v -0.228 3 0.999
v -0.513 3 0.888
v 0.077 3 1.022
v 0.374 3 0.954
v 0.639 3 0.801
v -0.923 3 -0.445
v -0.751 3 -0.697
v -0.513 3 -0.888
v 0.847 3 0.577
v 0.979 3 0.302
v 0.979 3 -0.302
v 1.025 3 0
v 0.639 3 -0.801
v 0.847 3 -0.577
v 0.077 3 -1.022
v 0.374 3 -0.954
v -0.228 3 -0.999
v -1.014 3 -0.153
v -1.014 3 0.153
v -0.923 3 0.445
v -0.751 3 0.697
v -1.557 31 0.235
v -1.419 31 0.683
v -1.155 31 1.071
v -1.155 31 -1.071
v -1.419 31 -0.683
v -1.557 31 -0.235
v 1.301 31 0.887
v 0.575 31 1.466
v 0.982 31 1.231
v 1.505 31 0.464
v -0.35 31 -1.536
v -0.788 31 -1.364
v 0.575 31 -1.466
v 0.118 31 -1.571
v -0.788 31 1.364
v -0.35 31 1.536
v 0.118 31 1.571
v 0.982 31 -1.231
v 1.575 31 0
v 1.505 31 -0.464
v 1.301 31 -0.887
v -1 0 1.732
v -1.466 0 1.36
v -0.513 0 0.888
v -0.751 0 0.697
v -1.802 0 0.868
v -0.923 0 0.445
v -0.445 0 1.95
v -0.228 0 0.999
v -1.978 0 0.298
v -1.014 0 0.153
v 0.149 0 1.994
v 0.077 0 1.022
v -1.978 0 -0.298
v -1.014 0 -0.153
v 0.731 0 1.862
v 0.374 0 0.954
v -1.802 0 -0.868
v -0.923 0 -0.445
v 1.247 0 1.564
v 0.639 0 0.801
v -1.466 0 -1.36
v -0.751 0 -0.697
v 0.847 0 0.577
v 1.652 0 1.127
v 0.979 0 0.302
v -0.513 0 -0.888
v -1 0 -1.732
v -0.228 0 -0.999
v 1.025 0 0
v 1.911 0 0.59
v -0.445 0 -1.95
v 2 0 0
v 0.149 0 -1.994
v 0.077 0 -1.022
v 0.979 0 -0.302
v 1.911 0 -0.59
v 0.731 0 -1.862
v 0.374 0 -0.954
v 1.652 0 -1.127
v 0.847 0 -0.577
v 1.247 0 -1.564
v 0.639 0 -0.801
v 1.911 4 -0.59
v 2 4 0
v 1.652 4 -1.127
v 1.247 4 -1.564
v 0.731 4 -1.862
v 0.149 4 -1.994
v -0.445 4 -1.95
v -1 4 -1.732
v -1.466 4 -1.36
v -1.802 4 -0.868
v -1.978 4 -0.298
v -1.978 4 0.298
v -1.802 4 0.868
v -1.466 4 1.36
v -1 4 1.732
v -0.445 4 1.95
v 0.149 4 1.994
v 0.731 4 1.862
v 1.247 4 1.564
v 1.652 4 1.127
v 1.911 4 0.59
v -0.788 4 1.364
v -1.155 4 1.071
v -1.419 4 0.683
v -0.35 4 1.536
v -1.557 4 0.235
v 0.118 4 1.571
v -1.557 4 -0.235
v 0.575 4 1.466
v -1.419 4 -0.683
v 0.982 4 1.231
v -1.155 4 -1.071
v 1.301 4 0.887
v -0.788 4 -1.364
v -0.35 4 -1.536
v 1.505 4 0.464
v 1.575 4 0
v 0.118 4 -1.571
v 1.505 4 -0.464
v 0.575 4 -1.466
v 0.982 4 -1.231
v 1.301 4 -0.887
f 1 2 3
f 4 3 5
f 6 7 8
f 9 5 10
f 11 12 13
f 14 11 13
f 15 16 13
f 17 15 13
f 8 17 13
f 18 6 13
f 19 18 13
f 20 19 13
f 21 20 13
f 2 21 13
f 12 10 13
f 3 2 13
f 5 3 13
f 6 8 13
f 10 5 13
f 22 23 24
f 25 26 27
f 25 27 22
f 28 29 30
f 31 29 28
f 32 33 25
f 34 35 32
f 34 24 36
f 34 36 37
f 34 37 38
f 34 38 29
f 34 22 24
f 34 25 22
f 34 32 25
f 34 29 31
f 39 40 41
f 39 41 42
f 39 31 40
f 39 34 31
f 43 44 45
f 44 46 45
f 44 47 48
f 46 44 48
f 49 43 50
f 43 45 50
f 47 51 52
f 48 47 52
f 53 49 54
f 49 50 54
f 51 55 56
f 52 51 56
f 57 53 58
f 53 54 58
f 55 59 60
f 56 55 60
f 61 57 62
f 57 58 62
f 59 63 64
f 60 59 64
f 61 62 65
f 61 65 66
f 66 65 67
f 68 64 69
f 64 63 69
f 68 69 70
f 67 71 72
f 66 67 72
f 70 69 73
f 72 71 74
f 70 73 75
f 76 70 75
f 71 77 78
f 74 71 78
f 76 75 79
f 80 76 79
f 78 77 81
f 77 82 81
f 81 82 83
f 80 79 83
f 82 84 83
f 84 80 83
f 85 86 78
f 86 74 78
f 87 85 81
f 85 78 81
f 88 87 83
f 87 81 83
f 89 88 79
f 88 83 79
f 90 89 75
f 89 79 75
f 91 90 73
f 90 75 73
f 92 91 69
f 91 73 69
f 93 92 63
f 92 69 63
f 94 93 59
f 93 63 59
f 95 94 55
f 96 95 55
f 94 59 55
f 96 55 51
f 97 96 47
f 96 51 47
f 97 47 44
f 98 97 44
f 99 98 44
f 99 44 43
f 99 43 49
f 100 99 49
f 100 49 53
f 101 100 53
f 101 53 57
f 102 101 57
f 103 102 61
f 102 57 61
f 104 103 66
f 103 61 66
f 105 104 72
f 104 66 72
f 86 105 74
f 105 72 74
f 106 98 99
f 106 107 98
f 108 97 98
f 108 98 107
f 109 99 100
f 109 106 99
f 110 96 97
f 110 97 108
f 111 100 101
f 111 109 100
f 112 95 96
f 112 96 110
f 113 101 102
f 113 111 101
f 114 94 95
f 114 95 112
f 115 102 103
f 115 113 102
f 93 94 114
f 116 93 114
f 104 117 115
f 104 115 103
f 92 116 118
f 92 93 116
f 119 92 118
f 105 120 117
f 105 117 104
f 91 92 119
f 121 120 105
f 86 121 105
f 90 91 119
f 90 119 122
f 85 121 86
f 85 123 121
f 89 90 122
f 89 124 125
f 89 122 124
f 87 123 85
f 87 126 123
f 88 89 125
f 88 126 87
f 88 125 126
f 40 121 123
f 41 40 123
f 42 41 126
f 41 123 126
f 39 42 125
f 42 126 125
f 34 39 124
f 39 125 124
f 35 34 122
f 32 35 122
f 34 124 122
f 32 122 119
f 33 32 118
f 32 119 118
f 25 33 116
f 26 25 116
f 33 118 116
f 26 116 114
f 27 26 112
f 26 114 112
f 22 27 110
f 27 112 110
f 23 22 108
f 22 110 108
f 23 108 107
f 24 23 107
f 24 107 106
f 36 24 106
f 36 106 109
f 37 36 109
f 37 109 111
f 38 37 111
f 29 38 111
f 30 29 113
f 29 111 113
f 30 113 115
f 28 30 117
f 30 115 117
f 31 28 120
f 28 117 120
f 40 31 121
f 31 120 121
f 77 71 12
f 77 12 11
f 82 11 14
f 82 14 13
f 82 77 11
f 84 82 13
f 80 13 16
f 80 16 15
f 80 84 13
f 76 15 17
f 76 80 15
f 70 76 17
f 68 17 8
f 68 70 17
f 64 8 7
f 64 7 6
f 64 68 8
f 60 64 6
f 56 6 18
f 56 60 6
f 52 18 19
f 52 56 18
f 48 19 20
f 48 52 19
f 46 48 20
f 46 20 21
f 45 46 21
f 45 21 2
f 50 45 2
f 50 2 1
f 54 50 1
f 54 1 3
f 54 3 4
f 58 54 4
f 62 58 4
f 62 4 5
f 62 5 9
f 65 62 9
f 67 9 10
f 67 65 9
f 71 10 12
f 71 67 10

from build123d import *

# Parameters (mm, degrees)
SKETCH1_R           = 2
SKETCH1_R_2         = 1.025
BOSS_EXTRUDE1_DEPTH = 3
SKETCH2_R           = 2
BOSS_EXTRUDE2_DEPTH = 1
SKETCH3_R           = 1.575
BOSS_EXTRUDE3_DEPTH = 27


with BuildPart() as part:
    # Sketch1 → Boss-Extrude1 (new body)
    with BuildSketch(Plane(origin=(0, 0, 0), x_dir=(1, 0, 0), z_dir=(0, 1, 0))):
        Circle(SKETCH1_R)
        Circle(SKETCH1_R_2, mode=Mode.SUBTRACT)
    extrude(amount=BOSS_EXTRUDE1_DEPTH)

    # Sketch2 → Boss-Extrude2 (add)
    with BuildSketch(Plane(origin=(0, 3, 0), x_dir=(1, 0, 0), z_dir=(0, 1, 0))):
        Circle(SKETCH2_R)
    extrude(amount=BOSS_EXTRUDE2_DEPTH)

    # Sketch3 → Boss-Extrude3 (add)
    with BuildSketch(Plane(origin=(0, 4, 0), x_dir=(1, 0, 0), z_dir=(0, 1, 0))):
        Circle(SKETCH3_R)
    extrude(amount=BOSS_EXTRUDE3_DEPTH)


solid = part.part
